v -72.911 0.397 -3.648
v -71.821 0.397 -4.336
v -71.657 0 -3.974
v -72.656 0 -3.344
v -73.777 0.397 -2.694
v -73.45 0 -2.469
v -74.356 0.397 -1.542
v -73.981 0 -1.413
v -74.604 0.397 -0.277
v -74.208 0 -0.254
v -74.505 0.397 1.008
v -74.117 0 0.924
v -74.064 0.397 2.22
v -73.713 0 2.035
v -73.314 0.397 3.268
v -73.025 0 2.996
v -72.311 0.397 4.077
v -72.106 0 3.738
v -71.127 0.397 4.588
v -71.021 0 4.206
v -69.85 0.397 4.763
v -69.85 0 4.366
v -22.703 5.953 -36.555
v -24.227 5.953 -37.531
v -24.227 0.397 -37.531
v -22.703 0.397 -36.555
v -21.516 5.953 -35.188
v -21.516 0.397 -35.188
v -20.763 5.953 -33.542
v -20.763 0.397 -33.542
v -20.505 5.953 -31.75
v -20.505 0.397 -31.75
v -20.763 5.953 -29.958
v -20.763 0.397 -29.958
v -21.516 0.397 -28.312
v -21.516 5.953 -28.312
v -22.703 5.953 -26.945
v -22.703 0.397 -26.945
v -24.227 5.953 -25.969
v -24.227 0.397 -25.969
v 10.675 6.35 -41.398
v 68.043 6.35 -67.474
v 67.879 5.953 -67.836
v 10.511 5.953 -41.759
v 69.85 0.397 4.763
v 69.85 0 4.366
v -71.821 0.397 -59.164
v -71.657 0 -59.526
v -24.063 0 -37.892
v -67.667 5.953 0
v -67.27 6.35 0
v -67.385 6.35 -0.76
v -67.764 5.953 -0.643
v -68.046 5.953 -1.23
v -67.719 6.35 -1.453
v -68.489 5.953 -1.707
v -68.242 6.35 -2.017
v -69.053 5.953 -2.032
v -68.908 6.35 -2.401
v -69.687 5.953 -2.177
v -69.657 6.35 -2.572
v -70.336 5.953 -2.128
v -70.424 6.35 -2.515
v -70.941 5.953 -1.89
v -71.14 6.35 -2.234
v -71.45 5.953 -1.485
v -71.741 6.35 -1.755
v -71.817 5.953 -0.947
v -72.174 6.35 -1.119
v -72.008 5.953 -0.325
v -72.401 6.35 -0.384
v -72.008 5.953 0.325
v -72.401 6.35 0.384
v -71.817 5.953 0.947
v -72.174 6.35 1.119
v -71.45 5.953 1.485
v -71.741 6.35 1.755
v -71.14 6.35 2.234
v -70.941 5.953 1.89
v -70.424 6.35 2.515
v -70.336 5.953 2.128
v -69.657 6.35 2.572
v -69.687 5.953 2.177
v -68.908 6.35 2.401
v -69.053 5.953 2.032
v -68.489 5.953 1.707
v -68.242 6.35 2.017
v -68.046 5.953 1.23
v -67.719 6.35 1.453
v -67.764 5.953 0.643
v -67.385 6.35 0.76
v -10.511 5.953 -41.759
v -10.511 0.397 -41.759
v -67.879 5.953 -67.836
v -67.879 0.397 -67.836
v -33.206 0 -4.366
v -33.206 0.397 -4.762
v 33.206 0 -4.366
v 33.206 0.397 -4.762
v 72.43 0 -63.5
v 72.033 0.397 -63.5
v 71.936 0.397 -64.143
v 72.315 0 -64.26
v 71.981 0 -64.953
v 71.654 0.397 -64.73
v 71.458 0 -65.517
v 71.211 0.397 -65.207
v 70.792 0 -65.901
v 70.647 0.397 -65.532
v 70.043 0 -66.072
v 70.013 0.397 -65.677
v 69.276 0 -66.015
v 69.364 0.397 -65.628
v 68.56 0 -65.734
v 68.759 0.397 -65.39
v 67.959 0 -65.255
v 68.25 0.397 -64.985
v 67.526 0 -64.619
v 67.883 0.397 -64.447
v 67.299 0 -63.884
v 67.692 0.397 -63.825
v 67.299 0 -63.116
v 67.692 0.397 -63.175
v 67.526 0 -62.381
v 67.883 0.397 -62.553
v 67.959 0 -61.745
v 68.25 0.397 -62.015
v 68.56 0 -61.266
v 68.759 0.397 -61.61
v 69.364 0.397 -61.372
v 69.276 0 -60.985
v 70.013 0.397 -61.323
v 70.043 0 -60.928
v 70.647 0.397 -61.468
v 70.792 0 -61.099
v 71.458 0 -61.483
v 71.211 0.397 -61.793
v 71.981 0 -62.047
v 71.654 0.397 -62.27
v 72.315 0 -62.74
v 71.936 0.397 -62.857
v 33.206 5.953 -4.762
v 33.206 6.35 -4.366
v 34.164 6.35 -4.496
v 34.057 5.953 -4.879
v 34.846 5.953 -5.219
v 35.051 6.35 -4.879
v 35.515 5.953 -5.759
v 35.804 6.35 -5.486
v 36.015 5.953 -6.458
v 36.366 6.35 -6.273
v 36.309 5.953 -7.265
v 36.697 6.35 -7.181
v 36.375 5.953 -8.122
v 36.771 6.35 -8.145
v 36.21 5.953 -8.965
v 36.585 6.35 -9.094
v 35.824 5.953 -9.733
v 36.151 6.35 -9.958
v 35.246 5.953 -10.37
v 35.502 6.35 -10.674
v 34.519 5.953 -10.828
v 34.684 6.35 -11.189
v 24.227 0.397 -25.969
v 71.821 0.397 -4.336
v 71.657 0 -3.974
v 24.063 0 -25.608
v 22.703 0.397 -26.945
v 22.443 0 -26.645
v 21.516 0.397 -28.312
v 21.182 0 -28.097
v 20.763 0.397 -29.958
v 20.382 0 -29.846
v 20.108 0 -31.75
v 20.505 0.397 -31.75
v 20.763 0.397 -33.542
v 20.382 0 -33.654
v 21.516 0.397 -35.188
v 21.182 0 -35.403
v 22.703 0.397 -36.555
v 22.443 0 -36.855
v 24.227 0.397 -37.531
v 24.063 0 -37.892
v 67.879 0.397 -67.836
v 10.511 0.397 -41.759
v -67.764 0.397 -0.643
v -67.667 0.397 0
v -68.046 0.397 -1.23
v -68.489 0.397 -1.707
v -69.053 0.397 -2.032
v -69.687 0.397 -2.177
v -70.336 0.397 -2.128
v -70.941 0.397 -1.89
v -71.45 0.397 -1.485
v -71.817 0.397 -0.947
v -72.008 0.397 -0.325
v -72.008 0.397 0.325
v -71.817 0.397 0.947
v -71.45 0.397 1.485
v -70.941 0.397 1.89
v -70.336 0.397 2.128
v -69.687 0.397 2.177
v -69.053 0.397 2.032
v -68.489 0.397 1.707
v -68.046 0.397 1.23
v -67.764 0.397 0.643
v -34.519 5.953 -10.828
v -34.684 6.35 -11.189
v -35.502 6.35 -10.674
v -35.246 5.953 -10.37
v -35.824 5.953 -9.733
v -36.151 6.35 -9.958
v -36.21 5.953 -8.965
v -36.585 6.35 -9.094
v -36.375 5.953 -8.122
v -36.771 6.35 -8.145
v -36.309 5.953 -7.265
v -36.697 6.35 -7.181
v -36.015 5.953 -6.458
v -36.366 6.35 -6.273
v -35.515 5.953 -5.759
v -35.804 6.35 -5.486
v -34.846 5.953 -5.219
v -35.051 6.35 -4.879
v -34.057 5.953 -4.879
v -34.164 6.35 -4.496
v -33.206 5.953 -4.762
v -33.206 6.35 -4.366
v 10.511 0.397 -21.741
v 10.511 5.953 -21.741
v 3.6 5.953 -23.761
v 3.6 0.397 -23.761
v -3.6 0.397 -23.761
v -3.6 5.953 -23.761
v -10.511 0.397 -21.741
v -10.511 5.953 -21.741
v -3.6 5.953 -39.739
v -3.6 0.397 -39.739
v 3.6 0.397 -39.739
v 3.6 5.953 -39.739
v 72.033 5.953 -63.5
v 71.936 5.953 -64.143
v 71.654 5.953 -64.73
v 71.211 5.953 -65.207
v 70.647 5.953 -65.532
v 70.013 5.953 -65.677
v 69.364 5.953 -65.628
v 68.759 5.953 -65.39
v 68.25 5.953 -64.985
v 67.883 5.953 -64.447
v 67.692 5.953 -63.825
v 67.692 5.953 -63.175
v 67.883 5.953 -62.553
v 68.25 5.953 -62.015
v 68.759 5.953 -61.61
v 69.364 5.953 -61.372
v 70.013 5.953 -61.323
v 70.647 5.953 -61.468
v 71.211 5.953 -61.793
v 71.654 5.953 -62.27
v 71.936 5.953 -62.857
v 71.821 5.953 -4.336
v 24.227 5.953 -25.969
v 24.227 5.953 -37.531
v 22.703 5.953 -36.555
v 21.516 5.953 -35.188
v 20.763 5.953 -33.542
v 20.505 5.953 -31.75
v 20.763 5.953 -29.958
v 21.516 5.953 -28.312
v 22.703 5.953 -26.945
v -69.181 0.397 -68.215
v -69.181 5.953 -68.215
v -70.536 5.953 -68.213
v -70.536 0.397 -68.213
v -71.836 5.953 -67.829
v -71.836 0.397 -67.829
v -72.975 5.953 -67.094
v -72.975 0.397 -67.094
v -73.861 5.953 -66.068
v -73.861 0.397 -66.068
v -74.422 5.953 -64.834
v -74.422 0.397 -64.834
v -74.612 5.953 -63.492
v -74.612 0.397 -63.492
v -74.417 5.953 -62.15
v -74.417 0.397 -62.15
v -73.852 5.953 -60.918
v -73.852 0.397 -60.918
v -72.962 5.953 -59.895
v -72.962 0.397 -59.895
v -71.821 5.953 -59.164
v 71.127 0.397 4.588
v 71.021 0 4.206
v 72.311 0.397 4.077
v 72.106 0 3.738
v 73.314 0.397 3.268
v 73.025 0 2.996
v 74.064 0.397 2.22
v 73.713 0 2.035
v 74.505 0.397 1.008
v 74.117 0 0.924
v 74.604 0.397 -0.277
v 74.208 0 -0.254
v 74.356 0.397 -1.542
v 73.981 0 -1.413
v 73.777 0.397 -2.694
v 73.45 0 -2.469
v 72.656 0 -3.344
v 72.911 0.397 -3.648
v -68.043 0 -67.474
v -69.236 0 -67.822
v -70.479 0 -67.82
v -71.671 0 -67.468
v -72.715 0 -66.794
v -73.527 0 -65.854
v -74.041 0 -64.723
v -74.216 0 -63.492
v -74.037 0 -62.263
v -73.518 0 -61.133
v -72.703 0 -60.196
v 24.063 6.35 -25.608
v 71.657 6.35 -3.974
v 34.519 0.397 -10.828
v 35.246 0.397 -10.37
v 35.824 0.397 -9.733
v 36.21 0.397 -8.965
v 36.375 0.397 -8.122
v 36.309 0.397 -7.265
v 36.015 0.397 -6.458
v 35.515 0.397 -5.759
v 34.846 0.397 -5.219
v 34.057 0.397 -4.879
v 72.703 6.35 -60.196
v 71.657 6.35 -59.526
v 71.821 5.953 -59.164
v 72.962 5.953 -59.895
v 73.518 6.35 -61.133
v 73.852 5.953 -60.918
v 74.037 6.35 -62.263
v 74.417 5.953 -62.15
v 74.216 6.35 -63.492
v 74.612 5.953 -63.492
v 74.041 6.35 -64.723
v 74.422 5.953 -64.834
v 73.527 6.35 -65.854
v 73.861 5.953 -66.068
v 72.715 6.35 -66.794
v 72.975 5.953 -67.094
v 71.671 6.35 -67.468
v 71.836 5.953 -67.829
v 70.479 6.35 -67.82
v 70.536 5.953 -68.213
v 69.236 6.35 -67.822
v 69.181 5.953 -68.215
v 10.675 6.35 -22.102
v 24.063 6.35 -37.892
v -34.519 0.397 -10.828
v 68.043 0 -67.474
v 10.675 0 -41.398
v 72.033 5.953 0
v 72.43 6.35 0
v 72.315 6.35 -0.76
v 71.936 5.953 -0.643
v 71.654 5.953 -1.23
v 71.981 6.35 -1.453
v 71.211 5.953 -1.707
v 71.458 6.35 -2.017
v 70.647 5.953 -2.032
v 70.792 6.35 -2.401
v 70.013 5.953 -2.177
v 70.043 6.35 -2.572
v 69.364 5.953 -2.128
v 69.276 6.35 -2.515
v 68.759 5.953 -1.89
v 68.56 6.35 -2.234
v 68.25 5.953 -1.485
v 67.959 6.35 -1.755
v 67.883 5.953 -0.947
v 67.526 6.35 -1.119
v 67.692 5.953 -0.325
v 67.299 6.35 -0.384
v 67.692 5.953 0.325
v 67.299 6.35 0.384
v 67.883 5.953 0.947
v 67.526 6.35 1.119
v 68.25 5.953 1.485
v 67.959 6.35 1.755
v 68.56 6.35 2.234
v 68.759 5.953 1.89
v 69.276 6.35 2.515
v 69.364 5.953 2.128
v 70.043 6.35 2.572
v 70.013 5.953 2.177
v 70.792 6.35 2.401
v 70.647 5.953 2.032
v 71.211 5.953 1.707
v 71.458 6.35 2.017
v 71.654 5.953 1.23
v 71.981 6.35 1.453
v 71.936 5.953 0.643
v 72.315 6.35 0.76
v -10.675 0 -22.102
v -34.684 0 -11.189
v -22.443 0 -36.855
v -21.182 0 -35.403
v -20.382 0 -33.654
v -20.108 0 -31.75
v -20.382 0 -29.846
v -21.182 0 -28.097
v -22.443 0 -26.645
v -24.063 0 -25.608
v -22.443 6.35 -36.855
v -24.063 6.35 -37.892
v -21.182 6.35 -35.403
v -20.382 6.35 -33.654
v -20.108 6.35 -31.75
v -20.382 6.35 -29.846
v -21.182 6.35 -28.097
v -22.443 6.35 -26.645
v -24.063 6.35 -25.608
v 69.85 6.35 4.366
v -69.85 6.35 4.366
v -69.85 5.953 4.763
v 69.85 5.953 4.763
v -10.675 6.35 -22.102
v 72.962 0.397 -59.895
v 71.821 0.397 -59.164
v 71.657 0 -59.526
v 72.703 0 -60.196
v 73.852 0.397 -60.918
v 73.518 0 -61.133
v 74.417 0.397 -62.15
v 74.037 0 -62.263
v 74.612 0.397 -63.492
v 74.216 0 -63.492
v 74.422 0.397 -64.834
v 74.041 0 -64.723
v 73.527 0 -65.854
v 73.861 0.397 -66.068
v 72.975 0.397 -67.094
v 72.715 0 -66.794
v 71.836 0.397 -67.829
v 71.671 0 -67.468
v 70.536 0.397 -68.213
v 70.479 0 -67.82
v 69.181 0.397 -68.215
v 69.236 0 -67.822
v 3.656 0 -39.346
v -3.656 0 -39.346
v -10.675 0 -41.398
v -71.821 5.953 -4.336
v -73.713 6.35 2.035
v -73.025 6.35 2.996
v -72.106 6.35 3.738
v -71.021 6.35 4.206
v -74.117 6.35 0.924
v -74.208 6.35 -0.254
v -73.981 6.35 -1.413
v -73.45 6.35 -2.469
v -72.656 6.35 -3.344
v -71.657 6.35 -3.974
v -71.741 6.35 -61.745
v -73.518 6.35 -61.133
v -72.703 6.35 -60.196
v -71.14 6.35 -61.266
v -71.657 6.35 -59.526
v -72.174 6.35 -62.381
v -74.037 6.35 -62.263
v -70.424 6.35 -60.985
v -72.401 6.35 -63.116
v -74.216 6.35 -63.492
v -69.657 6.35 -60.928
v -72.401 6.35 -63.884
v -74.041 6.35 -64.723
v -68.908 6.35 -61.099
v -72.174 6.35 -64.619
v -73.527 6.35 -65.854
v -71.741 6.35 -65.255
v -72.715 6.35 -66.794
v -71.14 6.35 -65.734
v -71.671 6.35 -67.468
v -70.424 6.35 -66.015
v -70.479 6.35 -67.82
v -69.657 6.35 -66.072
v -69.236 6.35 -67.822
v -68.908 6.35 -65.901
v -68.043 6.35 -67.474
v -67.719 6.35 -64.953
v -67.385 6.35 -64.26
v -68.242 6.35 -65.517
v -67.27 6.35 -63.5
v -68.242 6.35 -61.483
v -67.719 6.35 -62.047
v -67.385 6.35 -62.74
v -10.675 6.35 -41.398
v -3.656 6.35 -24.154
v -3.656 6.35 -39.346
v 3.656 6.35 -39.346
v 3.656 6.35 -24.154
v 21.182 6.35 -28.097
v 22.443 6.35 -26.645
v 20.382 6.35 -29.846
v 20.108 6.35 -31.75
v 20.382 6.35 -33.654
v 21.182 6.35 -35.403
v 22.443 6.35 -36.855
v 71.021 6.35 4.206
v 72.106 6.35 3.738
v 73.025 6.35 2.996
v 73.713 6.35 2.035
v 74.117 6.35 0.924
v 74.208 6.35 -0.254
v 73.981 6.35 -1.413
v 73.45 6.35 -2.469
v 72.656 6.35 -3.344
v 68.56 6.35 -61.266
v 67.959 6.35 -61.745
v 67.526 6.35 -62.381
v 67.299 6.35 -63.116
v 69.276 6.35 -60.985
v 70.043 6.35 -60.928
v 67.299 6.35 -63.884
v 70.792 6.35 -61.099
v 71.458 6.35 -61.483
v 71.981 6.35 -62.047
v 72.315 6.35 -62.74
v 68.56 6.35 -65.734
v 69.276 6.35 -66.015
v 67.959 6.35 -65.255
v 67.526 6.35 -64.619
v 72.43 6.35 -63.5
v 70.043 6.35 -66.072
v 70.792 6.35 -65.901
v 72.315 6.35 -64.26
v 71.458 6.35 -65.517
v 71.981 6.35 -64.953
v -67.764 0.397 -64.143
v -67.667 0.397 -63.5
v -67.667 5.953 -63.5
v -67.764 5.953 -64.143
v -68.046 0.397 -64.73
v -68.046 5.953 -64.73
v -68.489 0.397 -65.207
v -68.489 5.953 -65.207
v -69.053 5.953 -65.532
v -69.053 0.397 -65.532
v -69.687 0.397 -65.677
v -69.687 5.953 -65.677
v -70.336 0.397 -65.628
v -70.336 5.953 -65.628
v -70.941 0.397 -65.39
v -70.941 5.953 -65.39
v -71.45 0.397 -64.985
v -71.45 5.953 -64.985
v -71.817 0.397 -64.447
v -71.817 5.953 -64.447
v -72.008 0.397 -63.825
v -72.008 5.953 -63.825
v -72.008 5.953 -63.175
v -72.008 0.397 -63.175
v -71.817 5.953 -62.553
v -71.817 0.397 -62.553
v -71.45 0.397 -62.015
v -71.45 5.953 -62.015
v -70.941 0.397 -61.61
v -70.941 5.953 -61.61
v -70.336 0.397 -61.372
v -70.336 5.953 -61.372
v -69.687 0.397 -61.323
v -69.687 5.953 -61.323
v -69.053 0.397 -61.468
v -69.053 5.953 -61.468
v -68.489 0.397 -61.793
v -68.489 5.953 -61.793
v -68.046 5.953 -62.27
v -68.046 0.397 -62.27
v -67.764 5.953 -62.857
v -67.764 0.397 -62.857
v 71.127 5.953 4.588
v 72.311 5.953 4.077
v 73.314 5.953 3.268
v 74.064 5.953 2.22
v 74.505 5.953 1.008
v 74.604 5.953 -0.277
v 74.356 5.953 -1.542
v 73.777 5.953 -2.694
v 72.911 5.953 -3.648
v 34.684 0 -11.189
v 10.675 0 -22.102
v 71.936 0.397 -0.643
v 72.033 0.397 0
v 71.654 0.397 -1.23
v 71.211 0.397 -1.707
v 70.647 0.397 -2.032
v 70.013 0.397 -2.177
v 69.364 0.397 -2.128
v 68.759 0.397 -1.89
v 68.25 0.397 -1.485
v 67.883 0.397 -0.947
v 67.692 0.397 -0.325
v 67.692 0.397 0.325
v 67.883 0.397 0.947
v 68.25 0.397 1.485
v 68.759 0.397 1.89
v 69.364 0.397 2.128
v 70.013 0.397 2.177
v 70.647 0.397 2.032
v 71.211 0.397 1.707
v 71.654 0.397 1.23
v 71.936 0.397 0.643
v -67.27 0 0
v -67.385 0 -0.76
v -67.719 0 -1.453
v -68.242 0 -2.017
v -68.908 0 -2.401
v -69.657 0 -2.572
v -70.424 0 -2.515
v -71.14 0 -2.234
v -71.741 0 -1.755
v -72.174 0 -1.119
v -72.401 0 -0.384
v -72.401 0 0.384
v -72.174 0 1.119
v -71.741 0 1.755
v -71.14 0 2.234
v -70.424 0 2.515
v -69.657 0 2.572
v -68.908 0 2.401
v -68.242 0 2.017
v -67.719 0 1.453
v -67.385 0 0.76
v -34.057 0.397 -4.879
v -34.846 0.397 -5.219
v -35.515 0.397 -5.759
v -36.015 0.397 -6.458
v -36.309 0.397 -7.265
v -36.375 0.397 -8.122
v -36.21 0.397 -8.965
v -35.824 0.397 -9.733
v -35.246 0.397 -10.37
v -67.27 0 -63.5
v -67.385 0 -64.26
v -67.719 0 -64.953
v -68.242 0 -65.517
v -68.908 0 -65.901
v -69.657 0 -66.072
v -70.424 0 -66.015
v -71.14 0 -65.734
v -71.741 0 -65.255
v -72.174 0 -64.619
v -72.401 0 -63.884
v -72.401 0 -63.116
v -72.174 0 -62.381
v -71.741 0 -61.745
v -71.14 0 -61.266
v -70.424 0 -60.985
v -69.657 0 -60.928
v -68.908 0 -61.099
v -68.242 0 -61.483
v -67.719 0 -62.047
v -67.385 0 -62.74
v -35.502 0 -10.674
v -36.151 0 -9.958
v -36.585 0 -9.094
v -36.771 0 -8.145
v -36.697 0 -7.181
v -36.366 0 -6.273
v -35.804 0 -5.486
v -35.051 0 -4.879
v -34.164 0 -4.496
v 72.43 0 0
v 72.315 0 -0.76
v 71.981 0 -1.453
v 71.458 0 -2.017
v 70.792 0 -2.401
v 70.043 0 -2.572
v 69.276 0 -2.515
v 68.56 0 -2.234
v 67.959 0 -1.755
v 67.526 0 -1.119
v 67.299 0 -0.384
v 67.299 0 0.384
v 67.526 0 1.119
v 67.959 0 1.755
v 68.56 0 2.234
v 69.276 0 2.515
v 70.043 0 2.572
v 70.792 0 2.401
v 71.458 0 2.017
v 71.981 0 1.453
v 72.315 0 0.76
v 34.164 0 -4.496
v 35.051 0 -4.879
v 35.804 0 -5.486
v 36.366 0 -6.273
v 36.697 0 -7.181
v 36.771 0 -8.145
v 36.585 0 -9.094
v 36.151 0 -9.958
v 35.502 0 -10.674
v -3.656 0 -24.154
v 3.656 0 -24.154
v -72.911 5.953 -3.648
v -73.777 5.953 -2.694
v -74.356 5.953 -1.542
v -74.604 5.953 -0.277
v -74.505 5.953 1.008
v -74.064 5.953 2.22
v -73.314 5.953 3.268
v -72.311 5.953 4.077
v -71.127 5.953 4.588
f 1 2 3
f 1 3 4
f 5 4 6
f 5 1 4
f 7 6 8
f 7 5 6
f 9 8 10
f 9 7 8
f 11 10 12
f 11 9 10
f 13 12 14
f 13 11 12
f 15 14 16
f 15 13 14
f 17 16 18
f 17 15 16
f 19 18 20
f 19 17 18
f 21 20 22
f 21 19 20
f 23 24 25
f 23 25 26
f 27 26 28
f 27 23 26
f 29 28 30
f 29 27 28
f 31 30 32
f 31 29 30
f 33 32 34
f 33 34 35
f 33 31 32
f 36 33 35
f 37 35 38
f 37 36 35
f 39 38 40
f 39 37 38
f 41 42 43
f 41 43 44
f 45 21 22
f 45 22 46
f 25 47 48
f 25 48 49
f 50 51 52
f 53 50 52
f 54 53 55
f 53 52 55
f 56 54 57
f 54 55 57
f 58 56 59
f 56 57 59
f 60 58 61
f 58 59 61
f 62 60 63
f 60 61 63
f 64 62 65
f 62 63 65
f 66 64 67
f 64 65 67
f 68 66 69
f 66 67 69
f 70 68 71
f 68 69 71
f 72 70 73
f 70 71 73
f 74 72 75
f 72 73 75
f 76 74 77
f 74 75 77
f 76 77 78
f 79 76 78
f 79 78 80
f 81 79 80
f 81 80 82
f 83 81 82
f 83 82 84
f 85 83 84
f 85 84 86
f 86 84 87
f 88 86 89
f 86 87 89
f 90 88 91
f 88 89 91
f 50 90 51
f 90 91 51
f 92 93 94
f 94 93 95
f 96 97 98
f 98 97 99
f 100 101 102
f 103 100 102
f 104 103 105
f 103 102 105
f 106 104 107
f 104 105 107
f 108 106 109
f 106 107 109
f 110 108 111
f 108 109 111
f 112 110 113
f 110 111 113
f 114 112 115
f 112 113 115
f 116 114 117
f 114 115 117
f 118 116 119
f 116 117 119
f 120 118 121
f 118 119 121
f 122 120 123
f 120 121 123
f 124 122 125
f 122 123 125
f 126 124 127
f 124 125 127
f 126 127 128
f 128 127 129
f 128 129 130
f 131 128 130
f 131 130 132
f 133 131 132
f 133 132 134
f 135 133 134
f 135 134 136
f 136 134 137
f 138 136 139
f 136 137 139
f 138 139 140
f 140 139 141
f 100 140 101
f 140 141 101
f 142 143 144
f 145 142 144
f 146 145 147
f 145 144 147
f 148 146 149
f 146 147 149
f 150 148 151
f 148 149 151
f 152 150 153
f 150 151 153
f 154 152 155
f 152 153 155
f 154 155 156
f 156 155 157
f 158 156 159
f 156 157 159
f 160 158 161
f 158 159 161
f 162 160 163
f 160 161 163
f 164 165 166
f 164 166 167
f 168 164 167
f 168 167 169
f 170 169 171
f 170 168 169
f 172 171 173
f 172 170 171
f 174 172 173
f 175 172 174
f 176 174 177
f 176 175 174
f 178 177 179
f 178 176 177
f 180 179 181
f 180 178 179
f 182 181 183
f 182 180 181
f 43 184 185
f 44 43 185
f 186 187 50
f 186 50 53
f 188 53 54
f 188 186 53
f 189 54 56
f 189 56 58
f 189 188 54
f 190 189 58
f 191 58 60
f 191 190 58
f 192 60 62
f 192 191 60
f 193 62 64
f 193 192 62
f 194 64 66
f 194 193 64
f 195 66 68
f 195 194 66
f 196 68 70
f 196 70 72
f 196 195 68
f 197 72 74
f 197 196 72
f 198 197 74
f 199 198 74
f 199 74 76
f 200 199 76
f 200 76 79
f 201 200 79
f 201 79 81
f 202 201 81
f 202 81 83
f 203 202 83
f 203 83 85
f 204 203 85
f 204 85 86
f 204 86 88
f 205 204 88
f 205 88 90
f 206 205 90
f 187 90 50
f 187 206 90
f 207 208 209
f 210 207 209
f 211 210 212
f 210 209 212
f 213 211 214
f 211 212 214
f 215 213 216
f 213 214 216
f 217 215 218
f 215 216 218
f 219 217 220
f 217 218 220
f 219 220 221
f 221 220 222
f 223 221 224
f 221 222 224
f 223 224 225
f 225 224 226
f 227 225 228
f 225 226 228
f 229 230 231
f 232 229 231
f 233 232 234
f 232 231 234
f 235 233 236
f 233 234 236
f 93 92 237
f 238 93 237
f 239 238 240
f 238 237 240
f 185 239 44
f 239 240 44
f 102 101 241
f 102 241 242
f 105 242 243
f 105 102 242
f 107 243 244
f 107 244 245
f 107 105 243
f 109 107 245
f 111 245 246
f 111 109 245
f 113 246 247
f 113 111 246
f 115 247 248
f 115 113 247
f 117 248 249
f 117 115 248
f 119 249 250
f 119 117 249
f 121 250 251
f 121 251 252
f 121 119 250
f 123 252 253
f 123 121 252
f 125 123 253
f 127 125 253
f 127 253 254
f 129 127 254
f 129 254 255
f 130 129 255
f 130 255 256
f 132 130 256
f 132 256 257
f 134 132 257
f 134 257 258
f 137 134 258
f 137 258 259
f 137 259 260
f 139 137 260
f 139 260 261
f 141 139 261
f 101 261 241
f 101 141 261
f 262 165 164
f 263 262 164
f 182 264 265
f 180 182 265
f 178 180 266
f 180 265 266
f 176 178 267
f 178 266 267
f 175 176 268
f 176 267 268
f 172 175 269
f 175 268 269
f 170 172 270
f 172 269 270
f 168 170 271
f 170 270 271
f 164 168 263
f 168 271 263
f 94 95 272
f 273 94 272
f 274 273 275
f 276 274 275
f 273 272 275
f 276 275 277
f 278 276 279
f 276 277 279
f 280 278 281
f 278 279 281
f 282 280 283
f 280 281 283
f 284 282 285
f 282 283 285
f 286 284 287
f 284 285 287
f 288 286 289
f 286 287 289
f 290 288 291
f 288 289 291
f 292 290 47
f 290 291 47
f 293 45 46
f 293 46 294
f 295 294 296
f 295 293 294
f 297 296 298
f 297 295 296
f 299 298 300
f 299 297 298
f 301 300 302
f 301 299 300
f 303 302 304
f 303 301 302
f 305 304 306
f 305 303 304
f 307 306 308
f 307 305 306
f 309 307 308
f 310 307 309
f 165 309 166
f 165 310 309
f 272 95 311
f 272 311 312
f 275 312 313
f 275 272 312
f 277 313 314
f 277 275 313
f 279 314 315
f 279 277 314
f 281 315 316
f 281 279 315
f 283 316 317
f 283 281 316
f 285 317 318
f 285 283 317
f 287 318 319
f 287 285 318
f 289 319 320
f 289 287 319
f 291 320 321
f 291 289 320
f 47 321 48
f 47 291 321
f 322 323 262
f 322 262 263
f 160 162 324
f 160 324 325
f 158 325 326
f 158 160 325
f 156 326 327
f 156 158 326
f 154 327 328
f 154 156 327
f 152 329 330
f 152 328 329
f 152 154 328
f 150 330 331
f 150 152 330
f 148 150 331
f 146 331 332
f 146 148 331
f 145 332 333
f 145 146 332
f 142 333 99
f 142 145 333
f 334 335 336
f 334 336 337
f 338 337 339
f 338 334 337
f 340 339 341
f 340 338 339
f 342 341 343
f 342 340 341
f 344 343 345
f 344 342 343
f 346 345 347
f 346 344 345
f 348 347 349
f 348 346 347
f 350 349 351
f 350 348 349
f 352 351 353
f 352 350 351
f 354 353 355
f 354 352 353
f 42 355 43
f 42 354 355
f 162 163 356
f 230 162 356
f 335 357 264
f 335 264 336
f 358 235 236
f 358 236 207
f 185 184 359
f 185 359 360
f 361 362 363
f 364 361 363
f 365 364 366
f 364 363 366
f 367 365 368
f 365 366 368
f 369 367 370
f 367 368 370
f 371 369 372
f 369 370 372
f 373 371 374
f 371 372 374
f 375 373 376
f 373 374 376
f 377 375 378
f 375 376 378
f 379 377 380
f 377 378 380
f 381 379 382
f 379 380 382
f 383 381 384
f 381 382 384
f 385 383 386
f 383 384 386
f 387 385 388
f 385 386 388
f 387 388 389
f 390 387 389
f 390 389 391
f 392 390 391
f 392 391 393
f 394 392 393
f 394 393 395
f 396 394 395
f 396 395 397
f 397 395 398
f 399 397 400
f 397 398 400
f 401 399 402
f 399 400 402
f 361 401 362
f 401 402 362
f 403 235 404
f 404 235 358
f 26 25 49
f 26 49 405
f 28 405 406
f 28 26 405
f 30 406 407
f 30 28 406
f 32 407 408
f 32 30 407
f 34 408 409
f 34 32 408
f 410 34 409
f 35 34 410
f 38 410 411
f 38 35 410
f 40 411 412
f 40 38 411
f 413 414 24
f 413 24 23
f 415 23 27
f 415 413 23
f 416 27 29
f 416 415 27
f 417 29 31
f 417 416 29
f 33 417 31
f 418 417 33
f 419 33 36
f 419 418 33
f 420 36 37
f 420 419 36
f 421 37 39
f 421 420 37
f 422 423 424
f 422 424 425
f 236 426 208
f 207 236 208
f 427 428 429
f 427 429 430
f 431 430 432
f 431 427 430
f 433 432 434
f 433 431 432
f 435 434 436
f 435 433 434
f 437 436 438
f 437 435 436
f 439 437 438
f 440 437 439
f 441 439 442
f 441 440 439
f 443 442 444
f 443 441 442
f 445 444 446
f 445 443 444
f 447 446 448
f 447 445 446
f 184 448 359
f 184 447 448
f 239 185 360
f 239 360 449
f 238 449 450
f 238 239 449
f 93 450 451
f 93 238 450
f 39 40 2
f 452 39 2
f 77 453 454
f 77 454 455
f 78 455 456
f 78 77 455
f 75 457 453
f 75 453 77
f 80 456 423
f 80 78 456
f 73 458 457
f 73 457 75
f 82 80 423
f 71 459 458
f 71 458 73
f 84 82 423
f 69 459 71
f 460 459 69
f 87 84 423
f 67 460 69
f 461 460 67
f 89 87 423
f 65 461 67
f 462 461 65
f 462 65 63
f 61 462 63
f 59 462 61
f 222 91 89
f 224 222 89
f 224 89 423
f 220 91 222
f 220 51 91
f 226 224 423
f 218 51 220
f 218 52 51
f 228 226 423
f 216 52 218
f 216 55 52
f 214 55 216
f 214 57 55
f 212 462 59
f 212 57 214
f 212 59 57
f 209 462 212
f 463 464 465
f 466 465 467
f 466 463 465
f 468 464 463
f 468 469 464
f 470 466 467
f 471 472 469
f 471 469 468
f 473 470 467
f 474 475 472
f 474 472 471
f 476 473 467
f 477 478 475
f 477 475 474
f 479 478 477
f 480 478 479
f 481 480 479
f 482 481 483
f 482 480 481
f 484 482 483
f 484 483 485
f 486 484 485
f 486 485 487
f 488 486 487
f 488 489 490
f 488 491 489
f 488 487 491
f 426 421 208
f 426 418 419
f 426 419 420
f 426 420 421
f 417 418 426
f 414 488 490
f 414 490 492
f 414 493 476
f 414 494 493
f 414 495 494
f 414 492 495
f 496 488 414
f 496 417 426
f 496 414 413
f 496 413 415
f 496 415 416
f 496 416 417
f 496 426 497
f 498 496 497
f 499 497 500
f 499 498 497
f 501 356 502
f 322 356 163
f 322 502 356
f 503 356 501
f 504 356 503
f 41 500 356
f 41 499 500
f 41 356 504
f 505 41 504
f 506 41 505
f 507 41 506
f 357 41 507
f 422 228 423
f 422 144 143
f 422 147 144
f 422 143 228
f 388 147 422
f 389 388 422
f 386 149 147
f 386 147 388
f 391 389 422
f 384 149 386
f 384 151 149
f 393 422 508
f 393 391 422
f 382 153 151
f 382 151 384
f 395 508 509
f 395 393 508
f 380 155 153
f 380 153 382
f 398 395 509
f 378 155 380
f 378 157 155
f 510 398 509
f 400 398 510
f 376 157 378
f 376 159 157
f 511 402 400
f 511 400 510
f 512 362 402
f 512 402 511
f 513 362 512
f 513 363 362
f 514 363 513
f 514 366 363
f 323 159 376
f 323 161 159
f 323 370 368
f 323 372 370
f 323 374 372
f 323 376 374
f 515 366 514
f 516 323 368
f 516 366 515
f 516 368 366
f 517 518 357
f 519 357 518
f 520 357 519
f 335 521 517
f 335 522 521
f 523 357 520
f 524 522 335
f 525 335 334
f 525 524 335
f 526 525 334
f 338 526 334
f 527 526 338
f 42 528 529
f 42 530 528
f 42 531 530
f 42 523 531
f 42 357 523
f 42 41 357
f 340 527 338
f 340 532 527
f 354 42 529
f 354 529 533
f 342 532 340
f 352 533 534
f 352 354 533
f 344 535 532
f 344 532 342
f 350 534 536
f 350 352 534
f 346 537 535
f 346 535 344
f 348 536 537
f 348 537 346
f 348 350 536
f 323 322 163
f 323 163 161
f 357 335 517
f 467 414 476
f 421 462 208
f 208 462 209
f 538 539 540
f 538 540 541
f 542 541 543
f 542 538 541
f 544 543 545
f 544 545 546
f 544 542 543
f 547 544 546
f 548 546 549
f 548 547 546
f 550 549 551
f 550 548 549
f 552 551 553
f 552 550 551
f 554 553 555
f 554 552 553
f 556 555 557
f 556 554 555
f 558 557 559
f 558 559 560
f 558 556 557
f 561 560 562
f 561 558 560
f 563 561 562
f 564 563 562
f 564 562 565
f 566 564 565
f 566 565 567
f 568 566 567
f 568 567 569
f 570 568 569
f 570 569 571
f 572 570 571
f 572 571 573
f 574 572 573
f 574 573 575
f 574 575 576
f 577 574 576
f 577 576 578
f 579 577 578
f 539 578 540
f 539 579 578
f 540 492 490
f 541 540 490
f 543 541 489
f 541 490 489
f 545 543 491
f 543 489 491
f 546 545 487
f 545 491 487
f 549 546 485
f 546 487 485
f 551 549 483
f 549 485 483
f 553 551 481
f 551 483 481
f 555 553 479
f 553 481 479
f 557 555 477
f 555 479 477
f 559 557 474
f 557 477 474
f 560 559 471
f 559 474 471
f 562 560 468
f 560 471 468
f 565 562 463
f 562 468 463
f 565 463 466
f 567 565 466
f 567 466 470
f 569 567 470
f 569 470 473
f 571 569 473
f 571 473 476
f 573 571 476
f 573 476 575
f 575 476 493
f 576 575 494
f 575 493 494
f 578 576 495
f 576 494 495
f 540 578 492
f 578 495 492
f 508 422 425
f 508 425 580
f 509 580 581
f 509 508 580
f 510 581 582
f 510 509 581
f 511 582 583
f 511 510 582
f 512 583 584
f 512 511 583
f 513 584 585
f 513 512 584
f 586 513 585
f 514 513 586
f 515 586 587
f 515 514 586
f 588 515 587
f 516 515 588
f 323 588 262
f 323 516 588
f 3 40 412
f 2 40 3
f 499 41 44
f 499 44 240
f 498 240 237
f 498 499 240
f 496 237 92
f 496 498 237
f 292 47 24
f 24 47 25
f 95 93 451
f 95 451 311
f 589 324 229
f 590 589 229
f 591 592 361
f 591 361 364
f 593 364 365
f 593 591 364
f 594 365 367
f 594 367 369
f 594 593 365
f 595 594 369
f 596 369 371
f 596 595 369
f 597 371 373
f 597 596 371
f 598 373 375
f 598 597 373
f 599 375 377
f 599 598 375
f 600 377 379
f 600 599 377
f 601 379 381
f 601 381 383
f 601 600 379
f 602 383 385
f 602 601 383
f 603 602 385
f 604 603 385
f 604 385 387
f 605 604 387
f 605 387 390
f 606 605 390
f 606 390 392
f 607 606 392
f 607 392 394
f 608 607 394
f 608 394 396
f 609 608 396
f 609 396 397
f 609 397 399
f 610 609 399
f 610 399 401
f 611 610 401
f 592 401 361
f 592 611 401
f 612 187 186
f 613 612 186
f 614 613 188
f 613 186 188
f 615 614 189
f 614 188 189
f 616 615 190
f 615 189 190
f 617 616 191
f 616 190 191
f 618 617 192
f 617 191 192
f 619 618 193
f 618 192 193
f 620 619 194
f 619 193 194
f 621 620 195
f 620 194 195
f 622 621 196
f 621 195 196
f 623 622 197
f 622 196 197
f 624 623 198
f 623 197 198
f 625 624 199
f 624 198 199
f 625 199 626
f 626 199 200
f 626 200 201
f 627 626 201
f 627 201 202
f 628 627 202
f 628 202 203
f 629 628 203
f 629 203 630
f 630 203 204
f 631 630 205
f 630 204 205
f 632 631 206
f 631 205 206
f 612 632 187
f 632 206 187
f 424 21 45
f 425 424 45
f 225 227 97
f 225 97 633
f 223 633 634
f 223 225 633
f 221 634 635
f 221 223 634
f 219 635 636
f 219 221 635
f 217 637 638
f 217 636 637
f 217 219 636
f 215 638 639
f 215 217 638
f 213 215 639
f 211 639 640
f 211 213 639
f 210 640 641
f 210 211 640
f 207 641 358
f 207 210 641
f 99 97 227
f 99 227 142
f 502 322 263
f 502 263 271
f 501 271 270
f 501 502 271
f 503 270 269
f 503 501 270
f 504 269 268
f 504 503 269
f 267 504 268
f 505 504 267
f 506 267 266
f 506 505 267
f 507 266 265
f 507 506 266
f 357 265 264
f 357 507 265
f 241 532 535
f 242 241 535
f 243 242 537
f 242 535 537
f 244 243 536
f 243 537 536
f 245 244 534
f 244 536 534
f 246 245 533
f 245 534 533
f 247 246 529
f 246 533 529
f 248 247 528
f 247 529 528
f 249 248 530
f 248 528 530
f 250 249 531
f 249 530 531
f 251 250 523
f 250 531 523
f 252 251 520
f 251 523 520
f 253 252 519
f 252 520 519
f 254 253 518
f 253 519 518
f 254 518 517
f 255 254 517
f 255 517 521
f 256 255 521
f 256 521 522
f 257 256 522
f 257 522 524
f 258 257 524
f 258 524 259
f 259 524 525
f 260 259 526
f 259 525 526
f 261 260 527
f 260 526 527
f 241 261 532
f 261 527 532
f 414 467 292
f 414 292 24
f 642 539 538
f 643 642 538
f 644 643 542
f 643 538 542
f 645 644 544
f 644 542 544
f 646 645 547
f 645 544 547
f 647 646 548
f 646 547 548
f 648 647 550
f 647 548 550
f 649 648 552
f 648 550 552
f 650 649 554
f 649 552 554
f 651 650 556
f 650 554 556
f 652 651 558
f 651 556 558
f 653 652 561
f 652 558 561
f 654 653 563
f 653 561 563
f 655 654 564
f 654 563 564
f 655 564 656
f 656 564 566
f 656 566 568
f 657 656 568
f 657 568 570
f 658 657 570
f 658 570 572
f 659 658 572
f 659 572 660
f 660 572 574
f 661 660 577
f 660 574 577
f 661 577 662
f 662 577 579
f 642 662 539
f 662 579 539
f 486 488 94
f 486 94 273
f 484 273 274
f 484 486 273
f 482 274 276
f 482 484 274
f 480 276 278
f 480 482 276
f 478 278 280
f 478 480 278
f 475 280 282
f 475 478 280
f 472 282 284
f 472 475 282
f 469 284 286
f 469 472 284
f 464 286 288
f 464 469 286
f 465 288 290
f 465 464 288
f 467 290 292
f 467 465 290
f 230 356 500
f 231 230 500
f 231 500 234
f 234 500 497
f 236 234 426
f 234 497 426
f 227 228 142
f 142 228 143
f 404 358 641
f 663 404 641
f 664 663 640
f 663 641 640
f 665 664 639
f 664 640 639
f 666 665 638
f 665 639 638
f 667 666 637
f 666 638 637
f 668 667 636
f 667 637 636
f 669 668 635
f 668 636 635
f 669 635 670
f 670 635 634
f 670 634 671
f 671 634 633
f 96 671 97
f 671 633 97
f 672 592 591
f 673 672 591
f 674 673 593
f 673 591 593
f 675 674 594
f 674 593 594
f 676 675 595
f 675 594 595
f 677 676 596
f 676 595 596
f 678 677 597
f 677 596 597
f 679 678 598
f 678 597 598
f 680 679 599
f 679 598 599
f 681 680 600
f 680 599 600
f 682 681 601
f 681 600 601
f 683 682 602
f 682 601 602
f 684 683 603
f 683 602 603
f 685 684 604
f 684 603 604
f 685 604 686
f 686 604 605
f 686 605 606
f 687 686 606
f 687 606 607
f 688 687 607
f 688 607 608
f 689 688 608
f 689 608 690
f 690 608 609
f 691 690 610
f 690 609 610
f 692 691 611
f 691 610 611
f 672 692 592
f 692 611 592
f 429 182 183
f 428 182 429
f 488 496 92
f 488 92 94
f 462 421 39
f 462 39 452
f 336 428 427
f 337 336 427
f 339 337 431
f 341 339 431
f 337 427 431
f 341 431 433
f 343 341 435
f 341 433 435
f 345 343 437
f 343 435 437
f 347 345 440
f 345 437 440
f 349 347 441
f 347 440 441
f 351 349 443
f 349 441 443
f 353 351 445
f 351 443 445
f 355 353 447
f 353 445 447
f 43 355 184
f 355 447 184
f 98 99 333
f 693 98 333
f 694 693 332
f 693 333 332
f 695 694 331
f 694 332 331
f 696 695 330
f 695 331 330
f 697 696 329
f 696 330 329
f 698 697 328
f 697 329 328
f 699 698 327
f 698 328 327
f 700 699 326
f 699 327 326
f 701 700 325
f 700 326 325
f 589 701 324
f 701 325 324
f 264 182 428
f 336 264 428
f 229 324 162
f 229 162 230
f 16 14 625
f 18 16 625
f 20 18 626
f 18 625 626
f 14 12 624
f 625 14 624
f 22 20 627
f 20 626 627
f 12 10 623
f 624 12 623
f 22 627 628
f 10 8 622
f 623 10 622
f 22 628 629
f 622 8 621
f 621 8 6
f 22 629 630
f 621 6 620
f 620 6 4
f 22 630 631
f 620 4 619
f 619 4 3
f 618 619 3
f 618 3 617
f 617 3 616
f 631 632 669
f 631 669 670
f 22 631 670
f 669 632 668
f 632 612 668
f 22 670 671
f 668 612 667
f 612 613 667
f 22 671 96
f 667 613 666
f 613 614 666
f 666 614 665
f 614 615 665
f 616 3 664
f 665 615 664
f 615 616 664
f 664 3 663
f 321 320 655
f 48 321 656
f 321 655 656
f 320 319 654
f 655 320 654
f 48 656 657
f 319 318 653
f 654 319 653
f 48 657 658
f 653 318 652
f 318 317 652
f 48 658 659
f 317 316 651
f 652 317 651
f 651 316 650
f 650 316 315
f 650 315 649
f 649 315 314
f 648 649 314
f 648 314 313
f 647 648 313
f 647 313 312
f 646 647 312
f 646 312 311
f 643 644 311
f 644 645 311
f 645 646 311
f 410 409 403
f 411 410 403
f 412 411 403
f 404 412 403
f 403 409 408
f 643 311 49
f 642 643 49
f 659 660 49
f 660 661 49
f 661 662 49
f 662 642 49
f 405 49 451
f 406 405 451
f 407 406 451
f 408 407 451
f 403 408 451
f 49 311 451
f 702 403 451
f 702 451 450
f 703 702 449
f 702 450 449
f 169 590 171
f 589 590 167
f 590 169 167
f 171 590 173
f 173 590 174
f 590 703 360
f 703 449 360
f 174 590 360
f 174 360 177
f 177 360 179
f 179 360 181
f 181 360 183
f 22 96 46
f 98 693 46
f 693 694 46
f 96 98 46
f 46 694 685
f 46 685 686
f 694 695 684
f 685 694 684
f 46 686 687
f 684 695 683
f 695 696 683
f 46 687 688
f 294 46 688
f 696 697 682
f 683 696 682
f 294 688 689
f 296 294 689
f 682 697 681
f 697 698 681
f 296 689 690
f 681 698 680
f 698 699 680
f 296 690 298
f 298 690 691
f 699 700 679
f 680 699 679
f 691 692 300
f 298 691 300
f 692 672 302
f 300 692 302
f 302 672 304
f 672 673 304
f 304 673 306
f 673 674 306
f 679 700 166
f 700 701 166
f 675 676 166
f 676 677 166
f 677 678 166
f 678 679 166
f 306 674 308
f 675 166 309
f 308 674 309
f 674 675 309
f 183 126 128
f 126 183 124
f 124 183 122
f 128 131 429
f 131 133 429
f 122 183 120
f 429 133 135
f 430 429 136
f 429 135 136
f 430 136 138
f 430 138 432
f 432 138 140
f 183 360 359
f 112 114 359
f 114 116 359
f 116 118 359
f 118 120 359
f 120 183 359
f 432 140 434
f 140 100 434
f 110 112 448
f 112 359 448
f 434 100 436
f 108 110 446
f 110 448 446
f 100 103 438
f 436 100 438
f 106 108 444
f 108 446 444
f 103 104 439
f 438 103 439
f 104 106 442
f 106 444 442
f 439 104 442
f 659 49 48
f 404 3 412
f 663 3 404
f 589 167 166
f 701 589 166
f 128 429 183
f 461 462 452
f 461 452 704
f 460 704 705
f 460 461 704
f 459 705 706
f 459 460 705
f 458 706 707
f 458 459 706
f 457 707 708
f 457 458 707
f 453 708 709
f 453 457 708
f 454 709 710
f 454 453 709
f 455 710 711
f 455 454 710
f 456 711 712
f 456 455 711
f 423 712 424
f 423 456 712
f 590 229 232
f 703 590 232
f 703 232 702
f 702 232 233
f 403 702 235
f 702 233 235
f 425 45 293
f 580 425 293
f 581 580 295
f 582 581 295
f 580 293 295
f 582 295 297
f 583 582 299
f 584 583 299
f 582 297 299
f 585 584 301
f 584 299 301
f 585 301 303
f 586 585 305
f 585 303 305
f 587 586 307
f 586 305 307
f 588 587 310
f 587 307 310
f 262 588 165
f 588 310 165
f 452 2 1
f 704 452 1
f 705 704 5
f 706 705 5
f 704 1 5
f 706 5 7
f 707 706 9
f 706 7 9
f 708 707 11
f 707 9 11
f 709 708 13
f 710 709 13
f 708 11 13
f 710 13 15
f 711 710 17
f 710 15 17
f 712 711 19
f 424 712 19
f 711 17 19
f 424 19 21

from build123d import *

# Parameters (mm, degrees)
SKETCH1_R           = 2.1828125
BOSS_EXTRUDE1_DEPTH = 6.35
FILLET1_R           = 25.4
FILLET2_R           = 3.175
FILLET3_R           = 6.35
CHAMFER1_SIZE       = 0.396875


with BuildPart() as part:
    # Sketch1 → Boss-Extrude1 (new body)
    with BuildSketch(Plane(origin=(0, 0, 0), x_dir=(1, 0, 0), z_dir=(0, 1, 0))):
        with BuildLine():
            Line((-69.85, -4.7625), (69.85, -4.7625))
            ThreePointArc((69.85, -4.7625), (74.504556808, -1.008219802), (71.820736522, 4.335620349))
            Line((71.820736522, 4.335620349), (11.50910129, 31.75))
            Line((11.50910129, 31.75), (71.820736522, 59.164379651))
            ThreePointArc((71.820736522, 59.164379651), (74.185620349, 65.470736522), (67.879263478, 67.835620349))
            Line((67.879263478, 67.835620349), (0, 36.981409677))
            Line((0, 36.981409677), (-67.879263478, 67.835620349))
            ThreePointArc((-67.879263478, 67.835620349), (-74.185620349, 65.470736522), (-71.820736522, 59.164379651))
            Line((-71.820736522, 59.164379651), (-11.50910129, 31.75))
            Line((-11.50910129, 31.75), (-71.820736522, 4.335620349))
            ThreePointArc((-71.820736522, 4.335620349), (-74.504556808, -1.008219802), (-69.85, -4.7625))
        make_face()
        with Locations((-69.85, 0)):
            Circle(SKETCH1_R, mode=Mode.SUBTRACT)
        with Locations((69.85, 0)):
            Circle(SKETCH1_R, mode=Mode.SUBTRACT)
        with Locations((-69.85, 63.5)):
            Circle(SKETCH1_R, mode=Mode.SUBTRACT)
        with Locations((69.85, 63.5)):
            Circle(SKETCH1_R, mode=Mode.SUBTRACT)
        Polygon((-47.86339871, 4.7625), (47.86339871, 4.7625), (0, 26.518590323), align=None, mode=Mode.SUBTRACT)
    extrude(amount=BOSS_EXTRUDE1_DEPTH)

    # Fillet1
    fillet1_edges = [part.edges().sort_by_distance(p)[0] for p in [
        (0, 3.175, -36.981409677),
        (0, 3.175, -26.518590323),
    ]]
    fillet(fillet1_edges, radius=FILLET1_R)

    # Fillet2
    fillet2_edges = [part.edges().sort_by_distance(p)[0] for p in [
        (47.86339871, 3.175, -4.7625),
        (-47.86339871, 3.175, -4.7625),
    ]]
    fillet(fillet2_edges, radius=FILLET2_R)

    # Fillet3
    fillet3_edges = [part.edges().sort_by_distance(p)[0] for p in [
        (-11.50910129, 3.175, -31.75),
        (11.50910129, 3.175, -31.75),
    ]]
    fillet(fillet3_edges, radius=FILLET3_R)

    # Chamfer1
    chamfer1_edges = [part.edges().sort_by_distance(p)[0] for p in [
        (-48.023828751, 0, -48.347603391),
        (-74.185620349, 0, -65.470736522),
        (39.194929132, 0, -54.797286555),
        (74.504556808, 6.35, 1.008219802),
        (74.185620349, 0, -65.470736522),
        (48.023828751, 0, -15.152396609),
        (74.504556808, 0, 1.008219802),
        (0, 0, 4.7625),
        (-74.504556808, 0, 1.008219802),
        (48.023828751, 6.35, -15.152396609),
        (74.185620349, 6.35, -65.470736522),
        (-72.0328125, 0, 0),
        (-72.0328125, 6.35, 0),
        (39.194929132, 6.35, -54.797286555),
        (67.6671875, 0, 0),
        (67.6671875, 6.35, 0),
        (67.6671875, 0, -63.5),
        (67.6671875, 6.35, -63.5),
        (-74.185620349, 6.35, -65.470736522),
        (-72.0328125, 0, -63.5),
        (-72.0328125, 6.35, -63.5),
        (-48.023828751, 6.35, -48.347603391),
        (-74.504556808, 6.35, 1.008219802),
        (-22.515041825, 0, -16.284480402),
        (-22.515041825, 6.35, -16.284480402),
        (-39.194929132, 0, -54.797286555),
        (-39.194929132, 6.35, -54.797286555),
        (0, 0, -24.017738711),
        (0, 6.35, -24.017738711),
        (0, 0, -39.482261289),
        (0, 6.35, -39.482261289),
        (0, 0, -4.7625),
        (0, 6.35, -4.7625),
        (22.515041825, 6.35, -16.284480402),
        (22.515041825, 0, -16.284480402),
        (36.308702389, 0, -7.265353465),
        (36.308702389, 6.35, -7.265353465),
        (-36.308702389, 0, -7.265353465),
        (-36.308702389, 6.35, -7.265353465),
        (-48.023828751, 0, -15.152396609),
        (-48.023828751, 6.35, -15.152396609),
        (48.023828751, 0, -48.347603391),
        (48.023828751, 6.35, -48.347603391),
        (-20.504569676, 0, -31.75),
        (0, 6.35, 4.7625),
        (-20.504569676, 6.35, -31.75),
        (20.504569676, 0, -31.75),
        (20.504569676, 6.35, -31.75),
    ]]
    chamfer(chamfer1_edges, length=CHAMFER1_SIZE)


solid = part.part
